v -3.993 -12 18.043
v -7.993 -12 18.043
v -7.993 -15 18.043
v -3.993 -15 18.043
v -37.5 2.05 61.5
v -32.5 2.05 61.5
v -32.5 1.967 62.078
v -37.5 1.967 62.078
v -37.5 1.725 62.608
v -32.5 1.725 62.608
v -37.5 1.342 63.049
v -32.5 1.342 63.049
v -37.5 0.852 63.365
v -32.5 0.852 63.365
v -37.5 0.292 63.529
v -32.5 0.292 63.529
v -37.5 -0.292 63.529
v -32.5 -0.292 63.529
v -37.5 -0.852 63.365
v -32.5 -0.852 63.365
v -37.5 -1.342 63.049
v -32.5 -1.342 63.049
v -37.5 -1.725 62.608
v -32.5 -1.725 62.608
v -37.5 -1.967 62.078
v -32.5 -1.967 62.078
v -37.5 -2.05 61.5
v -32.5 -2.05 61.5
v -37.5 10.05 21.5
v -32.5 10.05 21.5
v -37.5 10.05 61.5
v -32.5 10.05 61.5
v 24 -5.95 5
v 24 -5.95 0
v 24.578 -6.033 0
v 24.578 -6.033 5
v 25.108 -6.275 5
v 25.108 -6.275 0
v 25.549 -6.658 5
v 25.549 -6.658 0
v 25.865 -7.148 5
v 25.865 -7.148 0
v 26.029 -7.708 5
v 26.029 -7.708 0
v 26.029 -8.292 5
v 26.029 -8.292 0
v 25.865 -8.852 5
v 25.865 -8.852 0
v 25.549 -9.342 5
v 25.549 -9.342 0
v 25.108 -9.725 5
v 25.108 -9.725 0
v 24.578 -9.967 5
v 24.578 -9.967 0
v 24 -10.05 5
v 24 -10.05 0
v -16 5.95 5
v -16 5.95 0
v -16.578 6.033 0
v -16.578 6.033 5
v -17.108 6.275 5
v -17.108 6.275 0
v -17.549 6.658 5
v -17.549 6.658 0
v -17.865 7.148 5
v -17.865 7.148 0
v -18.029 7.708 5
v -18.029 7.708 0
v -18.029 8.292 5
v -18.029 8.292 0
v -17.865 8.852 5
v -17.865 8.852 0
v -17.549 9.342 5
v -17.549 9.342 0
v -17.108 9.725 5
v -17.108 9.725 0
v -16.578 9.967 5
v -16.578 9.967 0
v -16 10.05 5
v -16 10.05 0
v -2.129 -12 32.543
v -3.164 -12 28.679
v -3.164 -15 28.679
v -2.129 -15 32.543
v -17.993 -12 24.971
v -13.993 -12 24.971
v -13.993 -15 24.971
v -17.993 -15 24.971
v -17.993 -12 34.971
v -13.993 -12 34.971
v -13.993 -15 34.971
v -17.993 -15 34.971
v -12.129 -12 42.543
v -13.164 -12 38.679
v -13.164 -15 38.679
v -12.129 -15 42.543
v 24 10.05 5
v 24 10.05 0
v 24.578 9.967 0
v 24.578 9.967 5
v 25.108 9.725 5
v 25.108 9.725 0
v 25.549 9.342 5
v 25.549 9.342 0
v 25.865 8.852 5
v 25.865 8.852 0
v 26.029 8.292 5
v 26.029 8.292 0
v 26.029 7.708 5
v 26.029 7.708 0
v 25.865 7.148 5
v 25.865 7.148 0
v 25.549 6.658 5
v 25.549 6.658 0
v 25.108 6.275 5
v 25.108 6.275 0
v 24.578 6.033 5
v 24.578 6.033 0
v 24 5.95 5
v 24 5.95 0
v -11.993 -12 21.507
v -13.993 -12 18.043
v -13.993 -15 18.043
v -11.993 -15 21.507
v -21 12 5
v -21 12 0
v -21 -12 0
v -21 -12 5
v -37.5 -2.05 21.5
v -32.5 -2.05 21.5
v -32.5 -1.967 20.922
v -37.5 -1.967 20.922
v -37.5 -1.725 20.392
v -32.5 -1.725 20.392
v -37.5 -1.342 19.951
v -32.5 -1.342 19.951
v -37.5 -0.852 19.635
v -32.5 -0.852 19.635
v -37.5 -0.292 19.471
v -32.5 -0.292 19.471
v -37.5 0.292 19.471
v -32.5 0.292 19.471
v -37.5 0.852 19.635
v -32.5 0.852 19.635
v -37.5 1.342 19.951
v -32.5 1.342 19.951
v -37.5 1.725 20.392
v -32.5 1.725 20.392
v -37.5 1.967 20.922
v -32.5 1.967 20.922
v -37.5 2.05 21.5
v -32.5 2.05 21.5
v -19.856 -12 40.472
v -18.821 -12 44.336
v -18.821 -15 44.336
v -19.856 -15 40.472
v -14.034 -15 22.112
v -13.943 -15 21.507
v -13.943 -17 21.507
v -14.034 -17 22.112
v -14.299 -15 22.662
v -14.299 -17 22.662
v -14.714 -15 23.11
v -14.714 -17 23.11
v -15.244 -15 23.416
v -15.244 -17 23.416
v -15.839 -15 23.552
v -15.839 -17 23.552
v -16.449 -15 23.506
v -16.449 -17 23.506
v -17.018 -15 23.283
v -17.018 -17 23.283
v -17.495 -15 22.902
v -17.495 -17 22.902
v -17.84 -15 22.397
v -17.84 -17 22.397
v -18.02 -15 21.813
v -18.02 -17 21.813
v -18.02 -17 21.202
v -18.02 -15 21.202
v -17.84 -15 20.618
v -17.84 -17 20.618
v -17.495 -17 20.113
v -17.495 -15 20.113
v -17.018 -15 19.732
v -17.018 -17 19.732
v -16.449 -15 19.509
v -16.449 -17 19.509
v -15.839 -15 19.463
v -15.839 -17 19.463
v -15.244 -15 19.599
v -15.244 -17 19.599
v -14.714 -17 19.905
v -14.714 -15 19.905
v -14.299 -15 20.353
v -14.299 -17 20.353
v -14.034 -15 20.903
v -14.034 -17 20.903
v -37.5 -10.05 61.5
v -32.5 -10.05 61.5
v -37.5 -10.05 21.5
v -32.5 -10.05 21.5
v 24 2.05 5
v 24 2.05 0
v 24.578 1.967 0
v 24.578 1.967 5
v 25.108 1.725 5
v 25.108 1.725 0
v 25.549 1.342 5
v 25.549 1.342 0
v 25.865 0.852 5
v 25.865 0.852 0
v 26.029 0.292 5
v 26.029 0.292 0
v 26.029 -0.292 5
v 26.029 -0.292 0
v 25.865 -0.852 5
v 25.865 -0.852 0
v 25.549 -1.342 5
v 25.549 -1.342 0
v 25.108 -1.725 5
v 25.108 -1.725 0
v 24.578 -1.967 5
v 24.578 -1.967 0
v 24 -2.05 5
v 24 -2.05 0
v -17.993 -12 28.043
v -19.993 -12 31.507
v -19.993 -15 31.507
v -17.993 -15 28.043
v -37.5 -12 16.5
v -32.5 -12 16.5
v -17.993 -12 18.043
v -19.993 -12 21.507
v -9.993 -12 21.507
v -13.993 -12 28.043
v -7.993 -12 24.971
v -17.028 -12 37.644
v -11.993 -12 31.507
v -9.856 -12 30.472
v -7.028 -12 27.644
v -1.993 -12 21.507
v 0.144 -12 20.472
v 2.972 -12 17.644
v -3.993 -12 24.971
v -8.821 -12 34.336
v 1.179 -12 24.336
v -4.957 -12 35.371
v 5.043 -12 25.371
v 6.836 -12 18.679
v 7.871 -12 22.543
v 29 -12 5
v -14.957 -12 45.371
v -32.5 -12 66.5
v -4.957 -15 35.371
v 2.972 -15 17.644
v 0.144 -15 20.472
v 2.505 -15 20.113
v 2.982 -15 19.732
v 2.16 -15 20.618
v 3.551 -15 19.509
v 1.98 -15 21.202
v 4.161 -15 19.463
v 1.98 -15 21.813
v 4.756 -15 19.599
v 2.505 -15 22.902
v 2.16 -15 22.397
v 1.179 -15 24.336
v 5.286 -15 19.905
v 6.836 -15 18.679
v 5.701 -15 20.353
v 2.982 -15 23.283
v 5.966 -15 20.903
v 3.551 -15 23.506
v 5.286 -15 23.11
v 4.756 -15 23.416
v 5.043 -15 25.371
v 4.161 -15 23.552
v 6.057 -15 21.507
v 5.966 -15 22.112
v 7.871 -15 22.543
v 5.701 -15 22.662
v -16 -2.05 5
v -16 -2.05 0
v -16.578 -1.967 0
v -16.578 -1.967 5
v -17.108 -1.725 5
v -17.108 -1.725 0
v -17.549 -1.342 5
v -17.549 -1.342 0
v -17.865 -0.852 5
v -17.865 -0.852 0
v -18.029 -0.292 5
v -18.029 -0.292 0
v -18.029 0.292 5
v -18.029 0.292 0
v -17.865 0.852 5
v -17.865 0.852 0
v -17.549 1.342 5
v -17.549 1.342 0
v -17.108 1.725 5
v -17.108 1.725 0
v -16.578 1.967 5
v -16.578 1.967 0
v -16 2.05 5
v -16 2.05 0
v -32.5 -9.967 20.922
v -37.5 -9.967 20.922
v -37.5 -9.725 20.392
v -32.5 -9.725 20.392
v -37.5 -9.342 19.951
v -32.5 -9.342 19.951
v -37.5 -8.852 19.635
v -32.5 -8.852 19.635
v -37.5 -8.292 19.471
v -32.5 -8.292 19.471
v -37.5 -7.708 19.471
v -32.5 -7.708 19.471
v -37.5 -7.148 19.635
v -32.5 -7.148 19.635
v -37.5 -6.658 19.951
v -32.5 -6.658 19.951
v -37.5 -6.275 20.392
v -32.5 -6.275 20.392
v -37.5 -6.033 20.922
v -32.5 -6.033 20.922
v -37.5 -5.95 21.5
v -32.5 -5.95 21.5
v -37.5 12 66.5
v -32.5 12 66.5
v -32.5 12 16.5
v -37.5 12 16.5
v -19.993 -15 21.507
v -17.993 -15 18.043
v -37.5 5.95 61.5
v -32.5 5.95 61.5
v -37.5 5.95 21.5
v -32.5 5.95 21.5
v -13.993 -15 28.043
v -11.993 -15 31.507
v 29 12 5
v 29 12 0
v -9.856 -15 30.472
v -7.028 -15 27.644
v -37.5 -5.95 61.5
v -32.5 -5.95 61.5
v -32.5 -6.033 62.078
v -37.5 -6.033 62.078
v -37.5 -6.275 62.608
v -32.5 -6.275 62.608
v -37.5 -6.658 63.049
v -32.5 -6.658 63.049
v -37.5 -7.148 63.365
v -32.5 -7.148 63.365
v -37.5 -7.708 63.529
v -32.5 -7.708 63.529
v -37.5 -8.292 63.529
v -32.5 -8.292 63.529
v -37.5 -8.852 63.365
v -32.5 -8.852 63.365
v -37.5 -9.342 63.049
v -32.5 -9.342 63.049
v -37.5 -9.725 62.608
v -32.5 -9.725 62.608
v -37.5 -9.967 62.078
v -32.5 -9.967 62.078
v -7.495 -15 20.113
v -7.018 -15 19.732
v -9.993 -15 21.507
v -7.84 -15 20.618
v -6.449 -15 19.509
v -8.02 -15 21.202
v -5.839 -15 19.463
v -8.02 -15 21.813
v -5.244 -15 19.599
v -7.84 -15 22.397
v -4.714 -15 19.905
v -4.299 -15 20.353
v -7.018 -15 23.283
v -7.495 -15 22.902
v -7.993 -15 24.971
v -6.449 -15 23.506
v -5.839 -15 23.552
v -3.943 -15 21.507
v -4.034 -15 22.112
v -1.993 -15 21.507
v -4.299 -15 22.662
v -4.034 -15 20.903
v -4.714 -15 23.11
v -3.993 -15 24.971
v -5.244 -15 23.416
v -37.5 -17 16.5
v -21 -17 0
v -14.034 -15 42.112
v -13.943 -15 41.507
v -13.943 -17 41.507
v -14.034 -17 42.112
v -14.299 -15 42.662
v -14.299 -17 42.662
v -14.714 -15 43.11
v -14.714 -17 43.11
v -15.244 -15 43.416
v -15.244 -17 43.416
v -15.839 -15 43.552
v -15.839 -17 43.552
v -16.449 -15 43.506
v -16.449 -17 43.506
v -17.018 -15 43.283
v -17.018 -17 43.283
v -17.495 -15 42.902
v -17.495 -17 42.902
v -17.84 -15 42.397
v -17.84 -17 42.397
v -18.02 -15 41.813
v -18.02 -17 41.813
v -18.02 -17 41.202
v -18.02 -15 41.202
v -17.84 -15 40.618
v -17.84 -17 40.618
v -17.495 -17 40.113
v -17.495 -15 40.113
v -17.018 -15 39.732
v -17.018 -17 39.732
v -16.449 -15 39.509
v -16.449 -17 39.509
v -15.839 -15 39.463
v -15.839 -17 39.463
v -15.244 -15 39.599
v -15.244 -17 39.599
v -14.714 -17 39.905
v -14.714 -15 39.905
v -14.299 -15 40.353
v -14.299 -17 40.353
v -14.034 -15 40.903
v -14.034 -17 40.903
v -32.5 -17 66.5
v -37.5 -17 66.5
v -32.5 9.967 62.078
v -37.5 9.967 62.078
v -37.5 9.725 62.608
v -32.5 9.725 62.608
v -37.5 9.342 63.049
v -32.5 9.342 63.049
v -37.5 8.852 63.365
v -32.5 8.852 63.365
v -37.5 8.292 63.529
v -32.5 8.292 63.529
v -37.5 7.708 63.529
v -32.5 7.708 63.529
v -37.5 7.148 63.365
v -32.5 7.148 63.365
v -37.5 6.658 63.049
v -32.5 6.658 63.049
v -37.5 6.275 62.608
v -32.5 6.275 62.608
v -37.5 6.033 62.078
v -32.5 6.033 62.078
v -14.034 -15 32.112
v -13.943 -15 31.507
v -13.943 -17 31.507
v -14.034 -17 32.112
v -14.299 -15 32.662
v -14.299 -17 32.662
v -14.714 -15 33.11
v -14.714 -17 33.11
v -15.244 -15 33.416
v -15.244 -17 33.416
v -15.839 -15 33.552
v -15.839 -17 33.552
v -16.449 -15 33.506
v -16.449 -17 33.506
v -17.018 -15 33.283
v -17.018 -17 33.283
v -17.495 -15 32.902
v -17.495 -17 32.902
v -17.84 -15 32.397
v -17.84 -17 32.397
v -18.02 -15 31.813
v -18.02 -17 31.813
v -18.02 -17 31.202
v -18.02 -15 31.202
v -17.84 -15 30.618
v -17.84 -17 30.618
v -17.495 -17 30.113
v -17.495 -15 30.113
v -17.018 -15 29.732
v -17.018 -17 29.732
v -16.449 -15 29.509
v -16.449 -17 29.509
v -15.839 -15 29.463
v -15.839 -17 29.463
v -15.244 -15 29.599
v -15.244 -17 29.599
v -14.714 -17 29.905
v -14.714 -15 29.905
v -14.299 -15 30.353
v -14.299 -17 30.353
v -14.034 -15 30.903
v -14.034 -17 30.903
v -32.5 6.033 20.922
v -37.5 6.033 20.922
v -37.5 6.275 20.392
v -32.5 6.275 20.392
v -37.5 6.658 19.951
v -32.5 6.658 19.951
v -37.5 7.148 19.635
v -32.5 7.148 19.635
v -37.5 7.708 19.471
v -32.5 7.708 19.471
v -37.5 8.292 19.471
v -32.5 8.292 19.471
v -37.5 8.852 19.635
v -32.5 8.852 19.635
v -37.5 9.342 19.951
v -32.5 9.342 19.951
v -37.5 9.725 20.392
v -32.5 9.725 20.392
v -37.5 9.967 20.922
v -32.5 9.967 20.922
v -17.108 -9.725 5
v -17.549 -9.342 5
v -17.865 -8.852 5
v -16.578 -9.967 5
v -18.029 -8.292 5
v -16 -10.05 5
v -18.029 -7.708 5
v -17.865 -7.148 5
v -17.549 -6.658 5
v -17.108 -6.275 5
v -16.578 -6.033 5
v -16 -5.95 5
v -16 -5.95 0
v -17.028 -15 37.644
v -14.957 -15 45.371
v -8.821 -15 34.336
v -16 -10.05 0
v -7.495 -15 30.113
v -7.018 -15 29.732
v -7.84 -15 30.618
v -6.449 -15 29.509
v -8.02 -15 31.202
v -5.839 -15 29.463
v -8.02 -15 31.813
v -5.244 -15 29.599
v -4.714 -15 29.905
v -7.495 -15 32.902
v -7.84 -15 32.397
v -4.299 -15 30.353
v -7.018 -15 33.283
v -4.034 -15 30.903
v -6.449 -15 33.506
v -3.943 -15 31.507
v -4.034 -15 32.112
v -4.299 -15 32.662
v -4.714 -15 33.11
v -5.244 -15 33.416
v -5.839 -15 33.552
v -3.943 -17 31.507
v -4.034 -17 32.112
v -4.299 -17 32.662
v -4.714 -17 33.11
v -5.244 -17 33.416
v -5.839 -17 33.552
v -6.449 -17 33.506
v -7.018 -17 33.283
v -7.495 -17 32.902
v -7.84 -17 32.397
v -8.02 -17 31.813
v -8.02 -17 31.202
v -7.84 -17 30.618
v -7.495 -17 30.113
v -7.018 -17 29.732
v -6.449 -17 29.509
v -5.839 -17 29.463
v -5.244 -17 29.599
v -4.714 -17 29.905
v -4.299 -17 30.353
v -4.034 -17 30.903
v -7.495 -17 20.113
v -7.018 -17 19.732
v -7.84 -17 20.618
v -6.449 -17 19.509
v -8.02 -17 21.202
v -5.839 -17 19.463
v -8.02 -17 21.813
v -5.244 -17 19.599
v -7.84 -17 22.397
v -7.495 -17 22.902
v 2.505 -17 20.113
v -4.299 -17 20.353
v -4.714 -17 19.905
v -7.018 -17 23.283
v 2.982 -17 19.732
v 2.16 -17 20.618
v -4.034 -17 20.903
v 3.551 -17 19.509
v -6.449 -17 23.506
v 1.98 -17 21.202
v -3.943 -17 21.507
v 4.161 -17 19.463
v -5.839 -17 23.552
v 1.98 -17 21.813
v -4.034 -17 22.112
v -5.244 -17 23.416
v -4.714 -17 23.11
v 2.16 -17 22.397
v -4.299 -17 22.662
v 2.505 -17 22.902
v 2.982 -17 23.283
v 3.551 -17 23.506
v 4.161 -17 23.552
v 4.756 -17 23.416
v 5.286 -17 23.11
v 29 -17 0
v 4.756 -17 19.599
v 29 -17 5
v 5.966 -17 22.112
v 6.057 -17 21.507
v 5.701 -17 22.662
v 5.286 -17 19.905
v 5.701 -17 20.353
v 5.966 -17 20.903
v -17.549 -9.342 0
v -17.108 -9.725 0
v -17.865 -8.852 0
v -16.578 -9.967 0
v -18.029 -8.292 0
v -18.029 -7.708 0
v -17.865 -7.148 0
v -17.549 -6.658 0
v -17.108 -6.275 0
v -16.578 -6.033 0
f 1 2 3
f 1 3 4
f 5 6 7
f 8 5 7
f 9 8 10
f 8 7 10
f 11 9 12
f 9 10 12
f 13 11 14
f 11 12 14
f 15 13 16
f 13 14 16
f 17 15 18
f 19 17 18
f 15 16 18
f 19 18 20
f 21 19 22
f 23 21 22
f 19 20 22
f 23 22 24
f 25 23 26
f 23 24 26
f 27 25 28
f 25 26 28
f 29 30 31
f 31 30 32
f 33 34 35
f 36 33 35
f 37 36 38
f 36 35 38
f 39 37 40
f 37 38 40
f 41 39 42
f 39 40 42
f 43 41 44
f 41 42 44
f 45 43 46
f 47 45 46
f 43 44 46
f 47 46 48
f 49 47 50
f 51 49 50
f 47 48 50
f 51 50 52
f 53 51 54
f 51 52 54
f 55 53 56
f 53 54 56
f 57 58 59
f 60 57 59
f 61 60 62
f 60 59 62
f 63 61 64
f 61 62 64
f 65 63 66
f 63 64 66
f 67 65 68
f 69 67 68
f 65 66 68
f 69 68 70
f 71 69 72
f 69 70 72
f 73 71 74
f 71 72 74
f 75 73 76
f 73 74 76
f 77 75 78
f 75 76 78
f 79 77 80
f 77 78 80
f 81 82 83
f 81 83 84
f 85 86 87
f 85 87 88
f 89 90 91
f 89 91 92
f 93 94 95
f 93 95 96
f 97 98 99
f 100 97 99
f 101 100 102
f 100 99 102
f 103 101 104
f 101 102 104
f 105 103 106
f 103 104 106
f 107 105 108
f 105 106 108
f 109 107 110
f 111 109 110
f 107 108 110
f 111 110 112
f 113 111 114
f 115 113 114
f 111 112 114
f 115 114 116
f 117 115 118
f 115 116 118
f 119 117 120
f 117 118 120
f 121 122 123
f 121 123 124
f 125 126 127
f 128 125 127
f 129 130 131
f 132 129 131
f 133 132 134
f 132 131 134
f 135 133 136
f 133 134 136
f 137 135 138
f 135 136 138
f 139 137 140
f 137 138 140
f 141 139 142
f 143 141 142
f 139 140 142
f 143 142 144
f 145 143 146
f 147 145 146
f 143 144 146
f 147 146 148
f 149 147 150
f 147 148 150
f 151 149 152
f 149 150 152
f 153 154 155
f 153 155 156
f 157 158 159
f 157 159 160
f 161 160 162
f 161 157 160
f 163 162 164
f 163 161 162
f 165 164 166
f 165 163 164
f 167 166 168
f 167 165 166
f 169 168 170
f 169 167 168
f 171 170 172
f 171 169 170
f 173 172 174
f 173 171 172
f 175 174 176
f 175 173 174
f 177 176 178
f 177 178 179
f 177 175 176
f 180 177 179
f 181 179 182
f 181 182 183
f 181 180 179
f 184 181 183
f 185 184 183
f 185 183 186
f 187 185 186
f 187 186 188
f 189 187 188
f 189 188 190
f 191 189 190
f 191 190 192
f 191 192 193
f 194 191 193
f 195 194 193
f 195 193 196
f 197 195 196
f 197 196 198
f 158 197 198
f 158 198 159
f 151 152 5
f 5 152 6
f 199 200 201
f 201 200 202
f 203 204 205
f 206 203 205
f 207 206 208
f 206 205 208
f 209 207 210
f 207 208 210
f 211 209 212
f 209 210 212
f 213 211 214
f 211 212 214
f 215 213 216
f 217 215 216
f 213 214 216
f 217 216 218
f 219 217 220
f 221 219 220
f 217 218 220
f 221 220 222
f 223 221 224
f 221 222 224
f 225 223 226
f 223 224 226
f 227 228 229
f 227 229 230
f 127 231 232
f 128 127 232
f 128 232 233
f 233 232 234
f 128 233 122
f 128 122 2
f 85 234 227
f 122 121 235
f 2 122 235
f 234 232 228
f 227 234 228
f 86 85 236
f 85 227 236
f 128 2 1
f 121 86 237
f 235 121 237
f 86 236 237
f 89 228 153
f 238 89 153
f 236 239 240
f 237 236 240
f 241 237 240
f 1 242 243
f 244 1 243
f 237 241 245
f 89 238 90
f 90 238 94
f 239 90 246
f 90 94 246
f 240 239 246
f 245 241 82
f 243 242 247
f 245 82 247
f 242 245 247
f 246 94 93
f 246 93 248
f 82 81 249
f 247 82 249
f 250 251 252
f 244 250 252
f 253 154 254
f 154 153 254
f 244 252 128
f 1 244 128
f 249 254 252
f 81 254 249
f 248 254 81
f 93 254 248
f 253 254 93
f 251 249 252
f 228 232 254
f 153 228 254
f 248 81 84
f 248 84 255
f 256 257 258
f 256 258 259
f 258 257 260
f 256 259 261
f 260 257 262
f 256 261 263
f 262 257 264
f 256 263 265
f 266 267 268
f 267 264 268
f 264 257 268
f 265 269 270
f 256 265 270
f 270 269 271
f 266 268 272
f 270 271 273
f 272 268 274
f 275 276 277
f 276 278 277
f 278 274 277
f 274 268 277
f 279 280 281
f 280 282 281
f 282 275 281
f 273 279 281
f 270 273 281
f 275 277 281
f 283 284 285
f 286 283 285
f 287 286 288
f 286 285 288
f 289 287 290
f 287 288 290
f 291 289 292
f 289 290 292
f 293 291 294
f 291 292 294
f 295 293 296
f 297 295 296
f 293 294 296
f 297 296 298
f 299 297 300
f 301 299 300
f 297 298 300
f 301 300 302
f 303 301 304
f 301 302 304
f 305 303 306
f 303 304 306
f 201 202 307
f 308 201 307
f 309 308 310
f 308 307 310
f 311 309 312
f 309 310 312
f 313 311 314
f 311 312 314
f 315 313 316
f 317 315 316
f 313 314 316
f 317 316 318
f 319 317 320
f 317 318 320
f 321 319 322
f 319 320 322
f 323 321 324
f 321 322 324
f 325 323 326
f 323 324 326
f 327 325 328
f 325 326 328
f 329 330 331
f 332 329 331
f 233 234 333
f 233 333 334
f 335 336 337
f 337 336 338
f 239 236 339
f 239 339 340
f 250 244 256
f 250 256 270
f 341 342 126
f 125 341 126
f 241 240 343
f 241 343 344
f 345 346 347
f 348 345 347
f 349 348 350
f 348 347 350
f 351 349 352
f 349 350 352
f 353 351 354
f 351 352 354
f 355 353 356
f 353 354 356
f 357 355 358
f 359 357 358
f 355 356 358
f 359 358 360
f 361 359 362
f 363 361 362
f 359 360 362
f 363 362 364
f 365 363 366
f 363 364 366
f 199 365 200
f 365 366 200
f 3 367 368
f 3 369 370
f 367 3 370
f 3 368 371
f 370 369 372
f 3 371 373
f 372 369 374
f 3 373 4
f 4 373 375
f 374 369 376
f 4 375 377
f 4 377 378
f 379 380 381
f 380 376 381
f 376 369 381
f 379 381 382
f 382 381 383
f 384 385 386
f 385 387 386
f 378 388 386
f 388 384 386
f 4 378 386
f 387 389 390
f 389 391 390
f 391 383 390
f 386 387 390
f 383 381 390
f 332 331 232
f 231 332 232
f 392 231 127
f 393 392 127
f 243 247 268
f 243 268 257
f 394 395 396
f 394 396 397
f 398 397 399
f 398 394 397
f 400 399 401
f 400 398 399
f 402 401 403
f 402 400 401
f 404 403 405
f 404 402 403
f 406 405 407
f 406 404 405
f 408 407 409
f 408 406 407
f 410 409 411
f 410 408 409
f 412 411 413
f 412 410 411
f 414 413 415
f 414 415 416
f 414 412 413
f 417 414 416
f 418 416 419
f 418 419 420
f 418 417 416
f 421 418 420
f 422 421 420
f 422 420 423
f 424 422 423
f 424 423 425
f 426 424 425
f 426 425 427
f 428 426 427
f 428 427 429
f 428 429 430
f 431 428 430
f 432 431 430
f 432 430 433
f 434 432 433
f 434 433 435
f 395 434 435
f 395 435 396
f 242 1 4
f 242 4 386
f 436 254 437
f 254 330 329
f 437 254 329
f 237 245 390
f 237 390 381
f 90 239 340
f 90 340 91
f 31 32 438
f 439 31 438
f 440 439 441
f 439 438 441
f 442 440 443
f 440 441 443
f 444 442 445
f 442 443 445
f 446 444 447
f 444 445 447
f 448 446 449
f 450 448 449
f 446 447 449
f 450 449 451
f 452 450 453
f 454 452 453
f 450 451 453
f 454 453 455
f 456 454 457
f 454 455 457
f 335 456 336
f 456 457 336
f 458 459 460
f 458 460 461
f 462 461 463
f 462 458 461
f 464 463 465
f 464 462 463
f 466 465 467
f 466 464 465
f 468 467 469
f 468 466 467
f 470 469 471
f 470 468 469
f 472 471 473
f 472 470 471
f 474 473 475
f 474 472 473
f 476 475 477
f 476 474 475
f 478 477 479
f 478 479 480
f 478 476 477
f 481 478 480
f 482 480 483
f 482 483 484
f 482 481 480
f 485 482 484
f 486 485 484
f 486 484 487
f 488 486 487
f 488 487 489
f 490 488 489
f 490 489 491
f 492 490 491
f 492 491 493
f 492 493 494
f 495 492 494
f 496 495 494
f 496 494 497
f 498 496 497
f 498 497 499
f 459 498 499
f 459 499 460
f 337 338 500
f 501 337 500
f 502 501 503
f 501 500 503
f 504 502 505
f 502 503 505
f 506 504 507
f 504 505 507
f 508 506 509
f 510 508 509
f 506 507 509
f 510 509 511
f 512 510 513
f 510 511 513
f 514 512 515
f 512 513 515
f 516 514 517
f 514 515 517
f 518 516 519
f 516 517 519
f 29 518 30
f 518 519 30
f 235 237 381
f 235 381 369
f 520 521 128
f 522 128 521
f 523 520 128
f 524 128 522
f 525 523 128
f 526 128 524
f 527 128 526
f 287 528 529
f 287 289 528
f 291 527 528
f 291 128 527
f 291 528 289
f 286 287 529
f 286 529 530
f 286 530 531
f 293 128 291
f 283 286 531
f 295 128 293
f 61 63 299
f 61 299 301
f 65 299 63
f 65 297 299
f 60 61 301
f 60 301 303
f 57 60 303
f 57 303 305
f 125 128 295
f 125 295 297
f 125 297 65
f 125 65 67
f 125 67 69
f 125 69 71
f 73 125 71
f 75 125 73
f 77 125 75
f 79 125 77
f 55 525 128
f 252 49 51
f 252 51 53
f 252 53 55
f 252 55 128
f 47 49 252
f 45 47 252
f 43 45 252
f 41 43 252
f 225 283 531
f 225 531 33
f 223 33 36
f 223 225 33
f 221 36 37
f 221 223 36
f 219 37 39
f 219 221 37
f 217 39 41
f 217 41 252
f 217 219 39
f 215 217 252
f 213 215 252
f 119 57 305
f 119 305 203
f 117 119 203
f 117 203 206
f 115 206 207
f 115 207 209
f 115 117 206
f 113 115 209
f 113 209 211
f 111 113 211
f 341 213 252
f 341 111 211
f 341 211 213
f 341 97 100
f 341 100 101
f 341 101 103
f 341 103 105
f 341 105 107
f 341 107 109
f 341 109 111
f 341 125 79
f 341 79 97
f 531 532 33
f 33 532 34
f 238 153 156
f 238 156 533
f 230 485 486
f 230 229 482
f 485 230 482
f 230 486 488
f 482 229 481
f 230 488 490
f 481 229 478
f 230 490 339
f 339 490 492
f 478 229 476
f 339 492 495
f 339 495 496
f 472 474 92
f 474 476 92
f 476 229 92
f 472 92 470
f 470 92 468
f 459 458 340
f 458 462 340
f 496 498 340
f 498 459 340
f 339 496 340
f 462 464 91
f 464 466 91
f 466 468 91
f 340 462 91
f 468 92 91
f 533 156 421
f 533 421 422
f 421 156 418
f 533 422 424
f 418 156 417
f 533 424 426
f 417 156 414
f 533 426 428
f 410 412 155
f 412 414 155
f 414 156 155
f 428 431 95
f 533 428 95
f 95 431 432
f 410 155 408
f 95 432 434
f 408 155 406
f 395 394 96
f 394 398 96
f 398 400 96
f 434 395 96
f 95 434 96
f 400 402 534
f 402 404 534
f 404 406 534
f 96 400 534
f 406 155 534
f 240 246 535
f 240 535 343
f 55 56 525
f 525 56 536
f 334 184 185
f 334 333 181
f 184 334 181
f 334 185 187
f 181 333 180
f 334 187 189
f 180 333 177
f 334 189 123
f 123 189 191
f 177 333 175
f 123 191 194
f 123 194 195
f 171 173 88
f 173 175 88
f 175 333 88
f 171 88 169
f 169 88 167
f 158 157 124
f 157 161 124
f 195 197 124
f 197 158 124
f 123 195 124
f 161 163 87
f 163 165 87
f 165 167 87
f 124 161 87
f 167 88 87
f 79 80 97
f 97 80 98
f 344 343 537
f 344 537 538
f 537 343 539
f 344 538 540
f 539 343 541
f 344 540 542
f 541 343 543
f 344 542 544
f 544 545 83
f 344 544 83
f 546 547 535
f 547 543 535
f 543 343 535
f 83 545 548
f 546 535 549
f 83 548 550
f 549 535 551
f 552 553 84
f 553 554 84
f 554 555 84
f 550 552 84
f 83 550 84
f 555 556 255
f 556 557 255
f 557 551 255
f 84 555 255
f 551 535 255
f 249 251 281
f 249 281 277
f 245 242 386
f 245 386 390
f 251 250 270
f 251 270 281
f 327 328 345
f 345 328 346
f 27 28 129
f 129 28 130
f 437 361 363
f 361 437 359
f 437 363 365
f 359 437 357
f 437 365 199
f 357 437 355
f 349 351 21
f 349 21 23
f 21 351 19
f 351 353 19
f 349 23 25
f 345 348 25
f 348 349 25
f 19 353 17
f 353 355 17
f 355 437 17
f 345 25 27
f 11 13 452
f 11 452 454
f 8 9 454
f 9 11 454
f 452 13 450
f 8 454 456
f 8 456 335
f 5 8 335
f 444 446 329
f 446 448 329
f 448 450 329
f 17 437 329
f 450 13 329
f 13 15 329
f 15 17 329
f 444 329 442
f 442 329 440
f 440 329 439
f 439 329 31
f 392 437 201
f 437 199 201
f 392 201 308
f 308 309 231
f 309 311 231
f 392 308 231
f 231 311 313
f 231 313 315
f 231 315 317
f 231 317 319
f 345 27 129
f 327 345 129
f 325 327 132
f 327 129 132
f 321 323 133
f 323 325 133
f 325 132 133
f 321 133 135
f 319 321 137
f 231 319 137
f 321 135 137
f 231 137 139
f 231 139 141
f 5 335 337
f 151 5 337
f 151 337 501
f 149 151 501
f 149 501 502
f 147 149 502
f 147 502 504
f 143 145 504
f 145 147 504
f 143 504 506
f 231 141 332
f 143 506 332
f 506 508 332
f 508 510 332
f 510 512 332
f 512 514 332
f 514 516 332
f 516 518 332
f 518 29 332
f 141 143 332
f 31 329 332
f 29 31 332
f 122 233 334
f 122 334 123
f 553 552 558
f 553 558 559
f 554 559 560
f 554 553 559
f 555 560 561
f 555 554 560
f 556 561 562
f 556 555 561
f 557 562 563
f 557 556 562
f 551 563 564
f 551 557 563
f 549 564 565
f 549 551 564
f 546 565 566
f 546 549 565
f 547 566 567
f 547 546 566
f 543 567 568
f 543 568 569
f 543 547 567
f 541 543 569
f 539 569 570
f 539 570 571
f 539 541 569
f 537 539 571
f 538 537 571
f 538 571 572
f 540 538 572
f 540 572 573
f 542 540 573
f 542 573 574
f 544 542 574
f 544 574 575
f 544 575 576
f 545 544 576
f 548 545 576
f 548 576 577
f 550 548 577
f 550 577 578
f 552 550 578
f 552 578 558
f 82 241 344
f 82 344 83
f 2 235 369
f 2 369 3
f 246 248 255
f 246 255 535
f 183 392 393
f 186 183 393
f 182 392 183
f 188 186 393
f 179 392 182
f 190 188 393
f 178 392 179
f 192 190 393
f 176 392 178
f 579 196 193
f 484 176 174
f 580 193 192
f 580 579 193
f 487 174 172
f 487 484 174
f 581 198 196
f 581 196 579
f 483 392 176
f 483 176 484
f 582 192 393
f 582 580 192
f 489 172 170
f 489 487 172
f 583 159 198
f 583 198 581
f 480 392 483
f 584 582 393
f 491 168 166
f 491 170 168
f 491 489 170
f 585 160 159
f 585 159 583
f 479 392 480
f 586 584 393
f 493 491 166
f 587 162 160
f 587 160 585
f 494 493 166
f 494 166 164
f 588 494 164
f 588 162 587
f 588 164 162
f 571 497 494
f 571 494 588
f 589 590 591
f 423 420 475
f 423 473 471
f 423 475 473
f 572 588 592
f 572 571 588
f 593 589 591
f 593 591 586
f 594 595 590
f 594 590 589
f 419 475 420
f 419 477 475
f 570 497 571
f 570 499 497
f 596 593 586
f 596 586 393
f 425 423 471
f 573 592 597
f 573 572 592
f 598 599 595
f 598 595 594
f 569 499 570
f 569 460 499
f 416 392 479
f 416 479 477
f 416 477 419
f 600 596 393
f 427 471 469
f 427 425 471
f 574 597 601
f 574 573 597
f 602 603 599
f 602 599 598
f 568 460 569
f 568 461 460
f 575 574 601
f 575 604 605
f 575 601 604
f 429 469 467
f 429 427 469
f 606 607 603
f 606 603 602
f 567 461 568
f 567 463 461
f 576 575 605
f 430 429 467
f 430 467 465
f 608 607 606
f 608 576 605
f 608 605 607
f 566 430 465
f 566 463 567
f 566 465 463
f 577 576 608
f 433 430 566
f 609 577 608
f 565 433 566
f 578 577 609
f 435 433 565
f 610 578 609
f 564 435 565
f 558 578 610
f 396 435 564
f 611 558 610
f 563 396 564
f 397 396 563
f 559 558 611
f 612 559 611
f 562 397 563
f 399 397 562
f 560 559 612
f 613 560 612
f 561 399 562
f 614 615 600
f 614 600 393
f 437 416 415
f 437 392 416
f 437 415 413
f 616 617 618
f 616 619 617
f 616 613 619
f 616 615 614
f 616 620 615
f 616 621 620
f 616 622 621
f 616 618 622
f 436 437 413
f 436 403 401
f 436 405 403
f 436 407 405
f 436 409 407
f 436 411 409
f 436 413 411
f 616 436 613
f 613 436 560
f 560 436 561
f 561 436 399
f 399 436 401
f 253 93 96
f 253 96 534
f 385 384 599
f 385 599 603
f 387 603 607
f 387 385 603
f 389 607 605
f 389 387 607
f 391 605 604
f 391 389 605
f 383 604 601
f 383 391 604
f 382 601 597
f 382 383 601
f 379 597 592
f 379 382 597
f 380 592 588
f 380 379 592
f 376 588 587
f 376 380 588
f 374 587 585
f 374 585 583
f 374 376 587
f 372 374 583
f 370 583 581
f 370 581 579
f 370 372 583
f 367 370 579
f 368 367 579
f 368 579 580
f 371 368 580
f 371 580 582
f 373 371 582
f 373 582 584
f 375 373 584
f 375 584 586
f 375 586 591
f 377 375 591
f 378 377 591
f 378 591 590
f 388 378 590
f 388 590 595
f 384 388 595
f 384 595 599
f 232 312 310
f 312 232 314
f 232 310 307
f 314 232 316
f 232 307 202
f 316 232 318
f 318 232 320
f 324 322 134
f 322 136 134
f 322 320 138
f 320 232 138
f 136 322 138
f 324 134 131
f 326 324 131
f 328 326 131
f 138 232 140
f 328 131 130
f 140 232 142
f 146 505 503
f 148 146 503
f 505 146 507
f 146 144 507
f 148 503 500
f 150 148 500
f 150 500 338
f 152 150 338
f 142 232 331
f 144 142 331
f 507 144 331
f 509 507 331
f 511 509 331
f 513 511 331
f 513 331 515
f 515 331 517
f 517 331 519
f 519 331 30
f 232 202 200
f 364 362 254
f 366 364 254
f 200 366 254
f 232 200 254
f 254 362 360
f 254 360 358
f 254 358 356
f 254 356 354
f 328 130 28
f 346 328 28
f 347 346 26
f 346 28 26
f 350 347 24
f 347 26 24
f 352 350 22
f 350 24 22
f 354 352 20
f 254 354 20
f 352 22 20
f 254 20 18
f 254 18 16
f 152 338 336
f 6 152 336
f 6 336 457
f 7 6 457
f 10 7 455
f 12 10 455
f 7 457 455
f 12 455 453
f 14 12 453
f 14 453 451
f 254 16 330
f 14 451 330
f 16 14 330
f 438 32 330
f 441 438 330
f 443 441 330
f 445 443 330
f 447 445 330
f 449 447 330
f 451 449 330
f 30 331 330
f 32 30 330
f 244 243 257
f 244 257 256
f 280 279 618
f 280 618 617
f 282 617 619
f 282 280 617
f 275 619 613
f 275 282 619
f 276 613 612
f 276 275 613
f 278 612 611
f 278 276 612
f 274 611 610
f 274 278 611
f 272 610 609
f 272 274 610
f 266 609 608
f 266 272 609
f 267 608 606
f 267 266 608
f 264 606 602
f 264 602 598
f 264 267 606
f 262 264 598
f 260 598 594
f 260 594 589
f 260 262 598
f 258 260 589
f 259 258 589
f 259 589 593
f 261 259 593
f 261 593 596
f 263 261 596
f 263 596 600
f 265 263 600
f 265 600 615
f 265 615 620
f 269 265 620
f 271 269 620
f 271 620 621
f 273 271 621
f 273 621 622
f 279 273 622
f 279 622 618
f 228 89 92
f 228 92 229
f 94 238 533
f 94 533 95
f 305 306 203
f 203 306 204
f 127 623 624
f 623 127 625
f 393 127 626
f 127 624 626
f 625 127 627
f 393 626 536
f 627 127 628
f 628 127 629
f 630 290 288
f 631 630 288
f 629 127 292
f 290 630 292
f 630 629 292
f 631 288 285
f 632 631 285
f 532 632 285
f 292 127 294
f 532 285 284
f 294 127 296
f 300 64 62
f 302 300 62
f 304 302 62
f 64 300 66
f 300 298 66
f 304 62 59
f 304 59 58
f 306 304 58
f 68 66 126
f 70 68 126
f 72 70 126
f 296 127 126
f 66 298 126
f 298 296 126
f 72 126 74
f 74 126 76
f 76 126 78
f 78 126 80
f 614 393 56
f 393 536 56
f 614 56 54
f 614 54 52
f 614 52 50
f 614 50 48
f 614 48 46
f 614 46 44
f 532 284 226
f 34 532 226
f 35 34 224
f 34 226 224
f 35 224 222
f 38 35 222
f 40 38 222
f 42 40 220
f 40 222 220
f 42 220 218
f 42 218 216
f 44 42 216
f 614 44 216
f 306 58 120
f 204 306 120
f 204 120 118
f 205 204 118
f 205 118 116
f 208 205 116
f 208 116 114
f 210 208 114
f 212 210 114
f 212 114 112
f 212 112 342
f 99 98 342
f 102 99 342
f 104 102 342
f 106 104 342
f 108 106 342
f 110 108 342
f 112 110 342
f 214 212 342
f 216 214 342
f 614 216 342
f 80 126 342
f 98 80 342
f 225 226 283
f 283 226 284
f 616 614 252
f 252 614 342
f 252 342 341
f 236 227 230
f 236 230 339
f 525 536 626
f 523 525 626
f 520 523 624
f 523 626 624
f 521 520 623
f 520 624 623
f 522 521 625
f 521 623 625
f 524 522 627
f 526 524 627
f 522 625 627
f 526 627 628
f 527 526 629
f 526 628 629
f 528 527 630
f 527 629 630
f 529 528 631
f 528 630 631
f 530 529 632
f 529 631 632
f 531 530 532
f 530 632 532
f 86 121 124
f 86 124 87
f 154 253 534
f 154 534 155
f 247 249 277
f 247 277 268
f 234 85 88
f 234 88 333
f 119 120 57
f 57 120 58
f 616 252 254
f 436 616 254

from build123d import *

# Parameters (mm, degrees)
F1_DEPTH = 5
F3_ANGLE = 90
F7_R     = 2.05
F8_DEPTH = 5
F9_DEPTH = 3


# Not quite as in the source:
# - a feature names something its author has since deleted; it is built from what else it names


with BuildPart() as f1:
    # F0 (on Top) → F1 (new body)
    with BuildSketch(Plane.XY):
        Polygon((29, 12), (-21, 12), (-21, -12), (0, -12), (29, -12), align=None)
        with BuildLine():
            ThreePointArc((-16, -10.05), (-18.05, -8), (-16, -5.95))
            Line((-16, -5.95), (0, -5.95))
            Line((0, -5.95), (24, -5.95))
            ThreePointArc((24, -5.95), (26.05, -8), (24, -10.05))
            Line((24, -10.05), (0, -10.05))
            Line((0, -10.05), (-16, -10.05))
        make_face(mode=Mode.SUBTRACT)
        with BuildLine():
            Line((0, -2.05), (-16, -2.05))
            ThreePointArc((-16, -2.05), (-18.05, 0), (-16, 2.05))
            Line((-16, 2.05), (0, 2.05))
            Line((0, 2.05), (24, 2.05))
            ThreePointArc((24, 2.05), (26.05, 0), (24, -2.05))
            Line((24, -2.05), (0, -2.05))
        make_face(mode=Mode.SUBTRACT)
        with BuildLine():
            Line((24, 5.95), (0, 5.95))
            Line((0, 5.95), (-16, 5.95))
            ThreePointArc((-16, 5.95), (-18.05, 8), (-16, 10.05))
            Line((-16, 10.05), (0, 10.05))
            Line((0, 10.05), (24, 10.05))
            ThreePointArc((24, 10.05), (26.05, 8), (24, 5.95))
        make_face(mode=Mode.SUBTRACT)
    extrude(amount=F1_DEPTH)


with BuildPart() as f3_1:
    # F3: copy of F1
    add(f1.part.rotate(Axis((-21, 0, 2.5), (0, -1, 0)), F3_ANGLE))


with BuildPart() as f3_1_1:
    # F4: moved
    add(f3_1.part.moved(Location((0, 0, 14))))


with BuildPart() as f3_1_2:
    # F5: moved
    add(f3_1_1.part.moved(Location((-14, 0, 0))))


with BuildPart() as f1_1:
    add(f1.part)

    add(f3_1_2.part)  # F8 merges F3_1
    # F7 (on 3pt) → F8 (join)
    with BuildSketch(Plane.XZ.offset(12)):
        Polygon((-37.5, 16.5), (-21, 0), (29, 0), (29, 5), (-32.5, 66.5), (-37.5, 66.5), align=None)
        Polygon((-19.9926406871, 21.5073593129), (-17.9926406871, 24.971460928), (-13.9926406871, 24.971460928), (-11.9926406871, 21.5073593129), (-13.9926406871, 18.0432576977), (-17.9926406871, 18.0432576977), align=None, mode=Mode.SUBTRACT)
        Polygon((-9.9926406871, 21.5073593129), (-7.9926406871, 24.971460928), (-3.9926406871, 24.971460928), (-1.9926406871, 21.5073593129), (-3.9926406871, 18.0432576977), (-7.9926406871, 18.0432576977), align=None, mode=Mode.SUBTRACT)
        Polygon((-19.9926406871, 31.5073593129), (-17.9926406871, 34.971460928), (-13.9926406871, 34.971460928), (-11.9926406871, 31.5073593129), (-13.9926406871, 28.0432576977), (-17.9926406871, 28.0432576977), align=None, mode=Mode.SUBTRACT)
        Polygon((-9.8563439923, 30.4720831325), (-8.8210678119, 34.3357864376), (-4.9573645067, 35.371062618), (-2.128937382, 32.5426354933), (-3.1642135624, 28.6789321881), (-7.0279168675, 27.6436560077), align=None, mode=Mode.SUBTRACT)
        Polygon((0.1436560077, 20.4720831325), (1.1789321881, 24.3357864376), (5.0426354933, 25.371062618), (7.871062618, 22.5426354933), (6.8357864376, 18.6789321881), (2.9720831325, 17.6436560077), align=None, mode=Mode.SUBTRACT)
        Polygon((-19.8563439923, 40.4720831325), (-18.8210678119, 44.3357864376), (-14.9573645067, 45.371062618), (-12.128937382, 42.5426354933), (-13.1642135624, 38.6789321881), (-17.0279168675, 37.6436560077), align=None, mode=Mode.SUBTRACT)
        Polygon((-4.9573645067, 35.371062618), (-8.8210678119, 34.3357864376), (-9.8563439923, 30.4720831325), (-7.0279168675, 27.6436560077), (-3.1642135624, 28.6789321881), (-2.128937382, 32.5426354933), align=None)
        with Locations((-5.9926406871, 31.5073593129)):
            Circle(F7_R, mode=Mode.SUBTRACT)
        Polygon((-14.9573645067, 45.371062618), (-18.8210678119, 44.3357864376), (-19.8563439923, 40.4720831325), (-17.0279168675, 37.6436560077), (-13.1642135624, 38.6789321881), (-12.128937382, 42.5426354933), align=None)
        with Locations((-15.9926406871, 41.5073593129)):
            Circle(F7_R, mode=Mode.SUBTRACT)
        Polygon((-13.9926406871, 34.971460928), (-17.9926406871, 34.971460928), (-19.9926406871, 31.5073593129), (-17.9926406871, 28.0432576977), (-13.9926406871, 28.0432576977), (-11.9926406871, 31.5073593129), align=None)
        with Locations((-15.9926406871, 31.5073593129)):
            Circle(F7_R, mode=Mode.SUBTRACT)
        Polygon((-13.9926406871, 24.971460928), (-17.9926406871, 24.971460928), (-19.9926406871, 21.5073593129), (-17.9926406871, 18.0432576977), (-13.9926406871, 18.0432576977), (-11.9926406871, 21.5073593129), align=None)
        with Locations((-15.9926406871, 21.5073593129)):
            Circle(F7_R, mode=Mode.SUBTRACT)
        Polygon((-3.9926406871, 24.971460928), (-7.9926406871, 24.971460928), (-9.9926406871, 21.5073593129), (-7.9926406871, 18.0432576977), (-3.9926406871, 18.0432576977), (-1.9926406871, 21.5073593129), align=None)
        with Locations((-5.9926406871, 21.5073593129)):
            Circle(F7_R, mode=Mode.SUBTRACT)
        Polygon((5.0426354933, 25.371062618), (1.1789321881, 24.3357864376), (0.1436560077, 20.4720831325), (2.9720831325, 17.6436560077), (6.8357864376, 18.6789321881), (7.871062618, 22.5426354933), align=None)
        with Locations((4.0073593129, 21.5073593129)):
            Circle(F7_R, mode=Mode.SUBTRACT)
    extrude(amount=F8_DEPTH)

    # F7 (on 3pt) → F9 (cut)
    with BuildSketch(Plane.XZ.offset(12)):
        Polygon((-4.9573645067, 35.371062618), (-8.8210678119, 34.3357864376), (-9.8563439923, 30.4720831325), (-7.0279168675, 27.6436560077), (-3.1642135624, 28.6789321881), (-2.128937382, 32.5426354933), align=None)
        with Locations((-5.9926406871, 31.5073593129)):
            Circle(F7_R, mode=Mode.SUBTRACT)
        Polygon((5.0426354933, 25.371062618), (1.1789321881, 24.3357864376), (0.1436560077, 20.4720831325), (2.9720831325, 17.6436560077), (6.8357864376, 18.6789321881), (7.871062618, 22.5426354933), align=None)
        with Locations((4.0073593129, 21.5073593129)):
            Circle(F7_R, mode=Mode.SUBTRACT)
        Polygon((-3.9926406871, 24.971460928), (-7.9926406871, 24.971460928), (-9.9926406871, 21.5073593129), (-7.9926406871, 18.0432576977), (-3.9926406871, 18.0432576977), (-1.9926406871, 21.5073593129), align=None)
        with Locations((-5.9926406871, 21.5073593129)):
            Circle(F7_R, mode=Mode.SUBTRACT)
        Polygon((-13.9926406871, 24.971460928), (-17.9926406871, 24.971460928), (-19.9926406871, 21.5073593129), (-17.9926406871, 18.0432576977), (-13.9926406871, 18.0432576977), (-11.9926406871, 21.5073593129), align=None)
        with Locations((-15.9926406871, 21.5073593129)):
            Circle(F7_R, mode=Mode.SUBTRACT)
        Polygon((-13.9926406871, 34.971460928), (-17.9926406871, 34.971460928), (-19.9926406871, 31.5073593129), (-17.9926406871, 28.0432576977), (-13.9926406871, 28.0432576977), (-11.9926406871, 31.5073593129), align=None)
        with Locations((-15.9926406871, 31.5073593129)):
            Circle(F7_R, mode=Mode.SUBTRACT)
        Polygon((-14.9573645067, 45.371062618), (-18.8210678119, 44.3357864376), (-19.8563439923, 40.4720831325), (-17.0279168675, 37.6436560077), (-13.1642135624, 38.6789321881), (-12.128937382, 42.5426354933), align=None)
        with Locations((-15.9926406871, 41.5073593129)):
            Circle(F7_R, mode=Mode.SUBTRACT)
    extrude(amount=F9_DEPTH, mode=Mode.SUBTRACT)


solid = f1_1.part
